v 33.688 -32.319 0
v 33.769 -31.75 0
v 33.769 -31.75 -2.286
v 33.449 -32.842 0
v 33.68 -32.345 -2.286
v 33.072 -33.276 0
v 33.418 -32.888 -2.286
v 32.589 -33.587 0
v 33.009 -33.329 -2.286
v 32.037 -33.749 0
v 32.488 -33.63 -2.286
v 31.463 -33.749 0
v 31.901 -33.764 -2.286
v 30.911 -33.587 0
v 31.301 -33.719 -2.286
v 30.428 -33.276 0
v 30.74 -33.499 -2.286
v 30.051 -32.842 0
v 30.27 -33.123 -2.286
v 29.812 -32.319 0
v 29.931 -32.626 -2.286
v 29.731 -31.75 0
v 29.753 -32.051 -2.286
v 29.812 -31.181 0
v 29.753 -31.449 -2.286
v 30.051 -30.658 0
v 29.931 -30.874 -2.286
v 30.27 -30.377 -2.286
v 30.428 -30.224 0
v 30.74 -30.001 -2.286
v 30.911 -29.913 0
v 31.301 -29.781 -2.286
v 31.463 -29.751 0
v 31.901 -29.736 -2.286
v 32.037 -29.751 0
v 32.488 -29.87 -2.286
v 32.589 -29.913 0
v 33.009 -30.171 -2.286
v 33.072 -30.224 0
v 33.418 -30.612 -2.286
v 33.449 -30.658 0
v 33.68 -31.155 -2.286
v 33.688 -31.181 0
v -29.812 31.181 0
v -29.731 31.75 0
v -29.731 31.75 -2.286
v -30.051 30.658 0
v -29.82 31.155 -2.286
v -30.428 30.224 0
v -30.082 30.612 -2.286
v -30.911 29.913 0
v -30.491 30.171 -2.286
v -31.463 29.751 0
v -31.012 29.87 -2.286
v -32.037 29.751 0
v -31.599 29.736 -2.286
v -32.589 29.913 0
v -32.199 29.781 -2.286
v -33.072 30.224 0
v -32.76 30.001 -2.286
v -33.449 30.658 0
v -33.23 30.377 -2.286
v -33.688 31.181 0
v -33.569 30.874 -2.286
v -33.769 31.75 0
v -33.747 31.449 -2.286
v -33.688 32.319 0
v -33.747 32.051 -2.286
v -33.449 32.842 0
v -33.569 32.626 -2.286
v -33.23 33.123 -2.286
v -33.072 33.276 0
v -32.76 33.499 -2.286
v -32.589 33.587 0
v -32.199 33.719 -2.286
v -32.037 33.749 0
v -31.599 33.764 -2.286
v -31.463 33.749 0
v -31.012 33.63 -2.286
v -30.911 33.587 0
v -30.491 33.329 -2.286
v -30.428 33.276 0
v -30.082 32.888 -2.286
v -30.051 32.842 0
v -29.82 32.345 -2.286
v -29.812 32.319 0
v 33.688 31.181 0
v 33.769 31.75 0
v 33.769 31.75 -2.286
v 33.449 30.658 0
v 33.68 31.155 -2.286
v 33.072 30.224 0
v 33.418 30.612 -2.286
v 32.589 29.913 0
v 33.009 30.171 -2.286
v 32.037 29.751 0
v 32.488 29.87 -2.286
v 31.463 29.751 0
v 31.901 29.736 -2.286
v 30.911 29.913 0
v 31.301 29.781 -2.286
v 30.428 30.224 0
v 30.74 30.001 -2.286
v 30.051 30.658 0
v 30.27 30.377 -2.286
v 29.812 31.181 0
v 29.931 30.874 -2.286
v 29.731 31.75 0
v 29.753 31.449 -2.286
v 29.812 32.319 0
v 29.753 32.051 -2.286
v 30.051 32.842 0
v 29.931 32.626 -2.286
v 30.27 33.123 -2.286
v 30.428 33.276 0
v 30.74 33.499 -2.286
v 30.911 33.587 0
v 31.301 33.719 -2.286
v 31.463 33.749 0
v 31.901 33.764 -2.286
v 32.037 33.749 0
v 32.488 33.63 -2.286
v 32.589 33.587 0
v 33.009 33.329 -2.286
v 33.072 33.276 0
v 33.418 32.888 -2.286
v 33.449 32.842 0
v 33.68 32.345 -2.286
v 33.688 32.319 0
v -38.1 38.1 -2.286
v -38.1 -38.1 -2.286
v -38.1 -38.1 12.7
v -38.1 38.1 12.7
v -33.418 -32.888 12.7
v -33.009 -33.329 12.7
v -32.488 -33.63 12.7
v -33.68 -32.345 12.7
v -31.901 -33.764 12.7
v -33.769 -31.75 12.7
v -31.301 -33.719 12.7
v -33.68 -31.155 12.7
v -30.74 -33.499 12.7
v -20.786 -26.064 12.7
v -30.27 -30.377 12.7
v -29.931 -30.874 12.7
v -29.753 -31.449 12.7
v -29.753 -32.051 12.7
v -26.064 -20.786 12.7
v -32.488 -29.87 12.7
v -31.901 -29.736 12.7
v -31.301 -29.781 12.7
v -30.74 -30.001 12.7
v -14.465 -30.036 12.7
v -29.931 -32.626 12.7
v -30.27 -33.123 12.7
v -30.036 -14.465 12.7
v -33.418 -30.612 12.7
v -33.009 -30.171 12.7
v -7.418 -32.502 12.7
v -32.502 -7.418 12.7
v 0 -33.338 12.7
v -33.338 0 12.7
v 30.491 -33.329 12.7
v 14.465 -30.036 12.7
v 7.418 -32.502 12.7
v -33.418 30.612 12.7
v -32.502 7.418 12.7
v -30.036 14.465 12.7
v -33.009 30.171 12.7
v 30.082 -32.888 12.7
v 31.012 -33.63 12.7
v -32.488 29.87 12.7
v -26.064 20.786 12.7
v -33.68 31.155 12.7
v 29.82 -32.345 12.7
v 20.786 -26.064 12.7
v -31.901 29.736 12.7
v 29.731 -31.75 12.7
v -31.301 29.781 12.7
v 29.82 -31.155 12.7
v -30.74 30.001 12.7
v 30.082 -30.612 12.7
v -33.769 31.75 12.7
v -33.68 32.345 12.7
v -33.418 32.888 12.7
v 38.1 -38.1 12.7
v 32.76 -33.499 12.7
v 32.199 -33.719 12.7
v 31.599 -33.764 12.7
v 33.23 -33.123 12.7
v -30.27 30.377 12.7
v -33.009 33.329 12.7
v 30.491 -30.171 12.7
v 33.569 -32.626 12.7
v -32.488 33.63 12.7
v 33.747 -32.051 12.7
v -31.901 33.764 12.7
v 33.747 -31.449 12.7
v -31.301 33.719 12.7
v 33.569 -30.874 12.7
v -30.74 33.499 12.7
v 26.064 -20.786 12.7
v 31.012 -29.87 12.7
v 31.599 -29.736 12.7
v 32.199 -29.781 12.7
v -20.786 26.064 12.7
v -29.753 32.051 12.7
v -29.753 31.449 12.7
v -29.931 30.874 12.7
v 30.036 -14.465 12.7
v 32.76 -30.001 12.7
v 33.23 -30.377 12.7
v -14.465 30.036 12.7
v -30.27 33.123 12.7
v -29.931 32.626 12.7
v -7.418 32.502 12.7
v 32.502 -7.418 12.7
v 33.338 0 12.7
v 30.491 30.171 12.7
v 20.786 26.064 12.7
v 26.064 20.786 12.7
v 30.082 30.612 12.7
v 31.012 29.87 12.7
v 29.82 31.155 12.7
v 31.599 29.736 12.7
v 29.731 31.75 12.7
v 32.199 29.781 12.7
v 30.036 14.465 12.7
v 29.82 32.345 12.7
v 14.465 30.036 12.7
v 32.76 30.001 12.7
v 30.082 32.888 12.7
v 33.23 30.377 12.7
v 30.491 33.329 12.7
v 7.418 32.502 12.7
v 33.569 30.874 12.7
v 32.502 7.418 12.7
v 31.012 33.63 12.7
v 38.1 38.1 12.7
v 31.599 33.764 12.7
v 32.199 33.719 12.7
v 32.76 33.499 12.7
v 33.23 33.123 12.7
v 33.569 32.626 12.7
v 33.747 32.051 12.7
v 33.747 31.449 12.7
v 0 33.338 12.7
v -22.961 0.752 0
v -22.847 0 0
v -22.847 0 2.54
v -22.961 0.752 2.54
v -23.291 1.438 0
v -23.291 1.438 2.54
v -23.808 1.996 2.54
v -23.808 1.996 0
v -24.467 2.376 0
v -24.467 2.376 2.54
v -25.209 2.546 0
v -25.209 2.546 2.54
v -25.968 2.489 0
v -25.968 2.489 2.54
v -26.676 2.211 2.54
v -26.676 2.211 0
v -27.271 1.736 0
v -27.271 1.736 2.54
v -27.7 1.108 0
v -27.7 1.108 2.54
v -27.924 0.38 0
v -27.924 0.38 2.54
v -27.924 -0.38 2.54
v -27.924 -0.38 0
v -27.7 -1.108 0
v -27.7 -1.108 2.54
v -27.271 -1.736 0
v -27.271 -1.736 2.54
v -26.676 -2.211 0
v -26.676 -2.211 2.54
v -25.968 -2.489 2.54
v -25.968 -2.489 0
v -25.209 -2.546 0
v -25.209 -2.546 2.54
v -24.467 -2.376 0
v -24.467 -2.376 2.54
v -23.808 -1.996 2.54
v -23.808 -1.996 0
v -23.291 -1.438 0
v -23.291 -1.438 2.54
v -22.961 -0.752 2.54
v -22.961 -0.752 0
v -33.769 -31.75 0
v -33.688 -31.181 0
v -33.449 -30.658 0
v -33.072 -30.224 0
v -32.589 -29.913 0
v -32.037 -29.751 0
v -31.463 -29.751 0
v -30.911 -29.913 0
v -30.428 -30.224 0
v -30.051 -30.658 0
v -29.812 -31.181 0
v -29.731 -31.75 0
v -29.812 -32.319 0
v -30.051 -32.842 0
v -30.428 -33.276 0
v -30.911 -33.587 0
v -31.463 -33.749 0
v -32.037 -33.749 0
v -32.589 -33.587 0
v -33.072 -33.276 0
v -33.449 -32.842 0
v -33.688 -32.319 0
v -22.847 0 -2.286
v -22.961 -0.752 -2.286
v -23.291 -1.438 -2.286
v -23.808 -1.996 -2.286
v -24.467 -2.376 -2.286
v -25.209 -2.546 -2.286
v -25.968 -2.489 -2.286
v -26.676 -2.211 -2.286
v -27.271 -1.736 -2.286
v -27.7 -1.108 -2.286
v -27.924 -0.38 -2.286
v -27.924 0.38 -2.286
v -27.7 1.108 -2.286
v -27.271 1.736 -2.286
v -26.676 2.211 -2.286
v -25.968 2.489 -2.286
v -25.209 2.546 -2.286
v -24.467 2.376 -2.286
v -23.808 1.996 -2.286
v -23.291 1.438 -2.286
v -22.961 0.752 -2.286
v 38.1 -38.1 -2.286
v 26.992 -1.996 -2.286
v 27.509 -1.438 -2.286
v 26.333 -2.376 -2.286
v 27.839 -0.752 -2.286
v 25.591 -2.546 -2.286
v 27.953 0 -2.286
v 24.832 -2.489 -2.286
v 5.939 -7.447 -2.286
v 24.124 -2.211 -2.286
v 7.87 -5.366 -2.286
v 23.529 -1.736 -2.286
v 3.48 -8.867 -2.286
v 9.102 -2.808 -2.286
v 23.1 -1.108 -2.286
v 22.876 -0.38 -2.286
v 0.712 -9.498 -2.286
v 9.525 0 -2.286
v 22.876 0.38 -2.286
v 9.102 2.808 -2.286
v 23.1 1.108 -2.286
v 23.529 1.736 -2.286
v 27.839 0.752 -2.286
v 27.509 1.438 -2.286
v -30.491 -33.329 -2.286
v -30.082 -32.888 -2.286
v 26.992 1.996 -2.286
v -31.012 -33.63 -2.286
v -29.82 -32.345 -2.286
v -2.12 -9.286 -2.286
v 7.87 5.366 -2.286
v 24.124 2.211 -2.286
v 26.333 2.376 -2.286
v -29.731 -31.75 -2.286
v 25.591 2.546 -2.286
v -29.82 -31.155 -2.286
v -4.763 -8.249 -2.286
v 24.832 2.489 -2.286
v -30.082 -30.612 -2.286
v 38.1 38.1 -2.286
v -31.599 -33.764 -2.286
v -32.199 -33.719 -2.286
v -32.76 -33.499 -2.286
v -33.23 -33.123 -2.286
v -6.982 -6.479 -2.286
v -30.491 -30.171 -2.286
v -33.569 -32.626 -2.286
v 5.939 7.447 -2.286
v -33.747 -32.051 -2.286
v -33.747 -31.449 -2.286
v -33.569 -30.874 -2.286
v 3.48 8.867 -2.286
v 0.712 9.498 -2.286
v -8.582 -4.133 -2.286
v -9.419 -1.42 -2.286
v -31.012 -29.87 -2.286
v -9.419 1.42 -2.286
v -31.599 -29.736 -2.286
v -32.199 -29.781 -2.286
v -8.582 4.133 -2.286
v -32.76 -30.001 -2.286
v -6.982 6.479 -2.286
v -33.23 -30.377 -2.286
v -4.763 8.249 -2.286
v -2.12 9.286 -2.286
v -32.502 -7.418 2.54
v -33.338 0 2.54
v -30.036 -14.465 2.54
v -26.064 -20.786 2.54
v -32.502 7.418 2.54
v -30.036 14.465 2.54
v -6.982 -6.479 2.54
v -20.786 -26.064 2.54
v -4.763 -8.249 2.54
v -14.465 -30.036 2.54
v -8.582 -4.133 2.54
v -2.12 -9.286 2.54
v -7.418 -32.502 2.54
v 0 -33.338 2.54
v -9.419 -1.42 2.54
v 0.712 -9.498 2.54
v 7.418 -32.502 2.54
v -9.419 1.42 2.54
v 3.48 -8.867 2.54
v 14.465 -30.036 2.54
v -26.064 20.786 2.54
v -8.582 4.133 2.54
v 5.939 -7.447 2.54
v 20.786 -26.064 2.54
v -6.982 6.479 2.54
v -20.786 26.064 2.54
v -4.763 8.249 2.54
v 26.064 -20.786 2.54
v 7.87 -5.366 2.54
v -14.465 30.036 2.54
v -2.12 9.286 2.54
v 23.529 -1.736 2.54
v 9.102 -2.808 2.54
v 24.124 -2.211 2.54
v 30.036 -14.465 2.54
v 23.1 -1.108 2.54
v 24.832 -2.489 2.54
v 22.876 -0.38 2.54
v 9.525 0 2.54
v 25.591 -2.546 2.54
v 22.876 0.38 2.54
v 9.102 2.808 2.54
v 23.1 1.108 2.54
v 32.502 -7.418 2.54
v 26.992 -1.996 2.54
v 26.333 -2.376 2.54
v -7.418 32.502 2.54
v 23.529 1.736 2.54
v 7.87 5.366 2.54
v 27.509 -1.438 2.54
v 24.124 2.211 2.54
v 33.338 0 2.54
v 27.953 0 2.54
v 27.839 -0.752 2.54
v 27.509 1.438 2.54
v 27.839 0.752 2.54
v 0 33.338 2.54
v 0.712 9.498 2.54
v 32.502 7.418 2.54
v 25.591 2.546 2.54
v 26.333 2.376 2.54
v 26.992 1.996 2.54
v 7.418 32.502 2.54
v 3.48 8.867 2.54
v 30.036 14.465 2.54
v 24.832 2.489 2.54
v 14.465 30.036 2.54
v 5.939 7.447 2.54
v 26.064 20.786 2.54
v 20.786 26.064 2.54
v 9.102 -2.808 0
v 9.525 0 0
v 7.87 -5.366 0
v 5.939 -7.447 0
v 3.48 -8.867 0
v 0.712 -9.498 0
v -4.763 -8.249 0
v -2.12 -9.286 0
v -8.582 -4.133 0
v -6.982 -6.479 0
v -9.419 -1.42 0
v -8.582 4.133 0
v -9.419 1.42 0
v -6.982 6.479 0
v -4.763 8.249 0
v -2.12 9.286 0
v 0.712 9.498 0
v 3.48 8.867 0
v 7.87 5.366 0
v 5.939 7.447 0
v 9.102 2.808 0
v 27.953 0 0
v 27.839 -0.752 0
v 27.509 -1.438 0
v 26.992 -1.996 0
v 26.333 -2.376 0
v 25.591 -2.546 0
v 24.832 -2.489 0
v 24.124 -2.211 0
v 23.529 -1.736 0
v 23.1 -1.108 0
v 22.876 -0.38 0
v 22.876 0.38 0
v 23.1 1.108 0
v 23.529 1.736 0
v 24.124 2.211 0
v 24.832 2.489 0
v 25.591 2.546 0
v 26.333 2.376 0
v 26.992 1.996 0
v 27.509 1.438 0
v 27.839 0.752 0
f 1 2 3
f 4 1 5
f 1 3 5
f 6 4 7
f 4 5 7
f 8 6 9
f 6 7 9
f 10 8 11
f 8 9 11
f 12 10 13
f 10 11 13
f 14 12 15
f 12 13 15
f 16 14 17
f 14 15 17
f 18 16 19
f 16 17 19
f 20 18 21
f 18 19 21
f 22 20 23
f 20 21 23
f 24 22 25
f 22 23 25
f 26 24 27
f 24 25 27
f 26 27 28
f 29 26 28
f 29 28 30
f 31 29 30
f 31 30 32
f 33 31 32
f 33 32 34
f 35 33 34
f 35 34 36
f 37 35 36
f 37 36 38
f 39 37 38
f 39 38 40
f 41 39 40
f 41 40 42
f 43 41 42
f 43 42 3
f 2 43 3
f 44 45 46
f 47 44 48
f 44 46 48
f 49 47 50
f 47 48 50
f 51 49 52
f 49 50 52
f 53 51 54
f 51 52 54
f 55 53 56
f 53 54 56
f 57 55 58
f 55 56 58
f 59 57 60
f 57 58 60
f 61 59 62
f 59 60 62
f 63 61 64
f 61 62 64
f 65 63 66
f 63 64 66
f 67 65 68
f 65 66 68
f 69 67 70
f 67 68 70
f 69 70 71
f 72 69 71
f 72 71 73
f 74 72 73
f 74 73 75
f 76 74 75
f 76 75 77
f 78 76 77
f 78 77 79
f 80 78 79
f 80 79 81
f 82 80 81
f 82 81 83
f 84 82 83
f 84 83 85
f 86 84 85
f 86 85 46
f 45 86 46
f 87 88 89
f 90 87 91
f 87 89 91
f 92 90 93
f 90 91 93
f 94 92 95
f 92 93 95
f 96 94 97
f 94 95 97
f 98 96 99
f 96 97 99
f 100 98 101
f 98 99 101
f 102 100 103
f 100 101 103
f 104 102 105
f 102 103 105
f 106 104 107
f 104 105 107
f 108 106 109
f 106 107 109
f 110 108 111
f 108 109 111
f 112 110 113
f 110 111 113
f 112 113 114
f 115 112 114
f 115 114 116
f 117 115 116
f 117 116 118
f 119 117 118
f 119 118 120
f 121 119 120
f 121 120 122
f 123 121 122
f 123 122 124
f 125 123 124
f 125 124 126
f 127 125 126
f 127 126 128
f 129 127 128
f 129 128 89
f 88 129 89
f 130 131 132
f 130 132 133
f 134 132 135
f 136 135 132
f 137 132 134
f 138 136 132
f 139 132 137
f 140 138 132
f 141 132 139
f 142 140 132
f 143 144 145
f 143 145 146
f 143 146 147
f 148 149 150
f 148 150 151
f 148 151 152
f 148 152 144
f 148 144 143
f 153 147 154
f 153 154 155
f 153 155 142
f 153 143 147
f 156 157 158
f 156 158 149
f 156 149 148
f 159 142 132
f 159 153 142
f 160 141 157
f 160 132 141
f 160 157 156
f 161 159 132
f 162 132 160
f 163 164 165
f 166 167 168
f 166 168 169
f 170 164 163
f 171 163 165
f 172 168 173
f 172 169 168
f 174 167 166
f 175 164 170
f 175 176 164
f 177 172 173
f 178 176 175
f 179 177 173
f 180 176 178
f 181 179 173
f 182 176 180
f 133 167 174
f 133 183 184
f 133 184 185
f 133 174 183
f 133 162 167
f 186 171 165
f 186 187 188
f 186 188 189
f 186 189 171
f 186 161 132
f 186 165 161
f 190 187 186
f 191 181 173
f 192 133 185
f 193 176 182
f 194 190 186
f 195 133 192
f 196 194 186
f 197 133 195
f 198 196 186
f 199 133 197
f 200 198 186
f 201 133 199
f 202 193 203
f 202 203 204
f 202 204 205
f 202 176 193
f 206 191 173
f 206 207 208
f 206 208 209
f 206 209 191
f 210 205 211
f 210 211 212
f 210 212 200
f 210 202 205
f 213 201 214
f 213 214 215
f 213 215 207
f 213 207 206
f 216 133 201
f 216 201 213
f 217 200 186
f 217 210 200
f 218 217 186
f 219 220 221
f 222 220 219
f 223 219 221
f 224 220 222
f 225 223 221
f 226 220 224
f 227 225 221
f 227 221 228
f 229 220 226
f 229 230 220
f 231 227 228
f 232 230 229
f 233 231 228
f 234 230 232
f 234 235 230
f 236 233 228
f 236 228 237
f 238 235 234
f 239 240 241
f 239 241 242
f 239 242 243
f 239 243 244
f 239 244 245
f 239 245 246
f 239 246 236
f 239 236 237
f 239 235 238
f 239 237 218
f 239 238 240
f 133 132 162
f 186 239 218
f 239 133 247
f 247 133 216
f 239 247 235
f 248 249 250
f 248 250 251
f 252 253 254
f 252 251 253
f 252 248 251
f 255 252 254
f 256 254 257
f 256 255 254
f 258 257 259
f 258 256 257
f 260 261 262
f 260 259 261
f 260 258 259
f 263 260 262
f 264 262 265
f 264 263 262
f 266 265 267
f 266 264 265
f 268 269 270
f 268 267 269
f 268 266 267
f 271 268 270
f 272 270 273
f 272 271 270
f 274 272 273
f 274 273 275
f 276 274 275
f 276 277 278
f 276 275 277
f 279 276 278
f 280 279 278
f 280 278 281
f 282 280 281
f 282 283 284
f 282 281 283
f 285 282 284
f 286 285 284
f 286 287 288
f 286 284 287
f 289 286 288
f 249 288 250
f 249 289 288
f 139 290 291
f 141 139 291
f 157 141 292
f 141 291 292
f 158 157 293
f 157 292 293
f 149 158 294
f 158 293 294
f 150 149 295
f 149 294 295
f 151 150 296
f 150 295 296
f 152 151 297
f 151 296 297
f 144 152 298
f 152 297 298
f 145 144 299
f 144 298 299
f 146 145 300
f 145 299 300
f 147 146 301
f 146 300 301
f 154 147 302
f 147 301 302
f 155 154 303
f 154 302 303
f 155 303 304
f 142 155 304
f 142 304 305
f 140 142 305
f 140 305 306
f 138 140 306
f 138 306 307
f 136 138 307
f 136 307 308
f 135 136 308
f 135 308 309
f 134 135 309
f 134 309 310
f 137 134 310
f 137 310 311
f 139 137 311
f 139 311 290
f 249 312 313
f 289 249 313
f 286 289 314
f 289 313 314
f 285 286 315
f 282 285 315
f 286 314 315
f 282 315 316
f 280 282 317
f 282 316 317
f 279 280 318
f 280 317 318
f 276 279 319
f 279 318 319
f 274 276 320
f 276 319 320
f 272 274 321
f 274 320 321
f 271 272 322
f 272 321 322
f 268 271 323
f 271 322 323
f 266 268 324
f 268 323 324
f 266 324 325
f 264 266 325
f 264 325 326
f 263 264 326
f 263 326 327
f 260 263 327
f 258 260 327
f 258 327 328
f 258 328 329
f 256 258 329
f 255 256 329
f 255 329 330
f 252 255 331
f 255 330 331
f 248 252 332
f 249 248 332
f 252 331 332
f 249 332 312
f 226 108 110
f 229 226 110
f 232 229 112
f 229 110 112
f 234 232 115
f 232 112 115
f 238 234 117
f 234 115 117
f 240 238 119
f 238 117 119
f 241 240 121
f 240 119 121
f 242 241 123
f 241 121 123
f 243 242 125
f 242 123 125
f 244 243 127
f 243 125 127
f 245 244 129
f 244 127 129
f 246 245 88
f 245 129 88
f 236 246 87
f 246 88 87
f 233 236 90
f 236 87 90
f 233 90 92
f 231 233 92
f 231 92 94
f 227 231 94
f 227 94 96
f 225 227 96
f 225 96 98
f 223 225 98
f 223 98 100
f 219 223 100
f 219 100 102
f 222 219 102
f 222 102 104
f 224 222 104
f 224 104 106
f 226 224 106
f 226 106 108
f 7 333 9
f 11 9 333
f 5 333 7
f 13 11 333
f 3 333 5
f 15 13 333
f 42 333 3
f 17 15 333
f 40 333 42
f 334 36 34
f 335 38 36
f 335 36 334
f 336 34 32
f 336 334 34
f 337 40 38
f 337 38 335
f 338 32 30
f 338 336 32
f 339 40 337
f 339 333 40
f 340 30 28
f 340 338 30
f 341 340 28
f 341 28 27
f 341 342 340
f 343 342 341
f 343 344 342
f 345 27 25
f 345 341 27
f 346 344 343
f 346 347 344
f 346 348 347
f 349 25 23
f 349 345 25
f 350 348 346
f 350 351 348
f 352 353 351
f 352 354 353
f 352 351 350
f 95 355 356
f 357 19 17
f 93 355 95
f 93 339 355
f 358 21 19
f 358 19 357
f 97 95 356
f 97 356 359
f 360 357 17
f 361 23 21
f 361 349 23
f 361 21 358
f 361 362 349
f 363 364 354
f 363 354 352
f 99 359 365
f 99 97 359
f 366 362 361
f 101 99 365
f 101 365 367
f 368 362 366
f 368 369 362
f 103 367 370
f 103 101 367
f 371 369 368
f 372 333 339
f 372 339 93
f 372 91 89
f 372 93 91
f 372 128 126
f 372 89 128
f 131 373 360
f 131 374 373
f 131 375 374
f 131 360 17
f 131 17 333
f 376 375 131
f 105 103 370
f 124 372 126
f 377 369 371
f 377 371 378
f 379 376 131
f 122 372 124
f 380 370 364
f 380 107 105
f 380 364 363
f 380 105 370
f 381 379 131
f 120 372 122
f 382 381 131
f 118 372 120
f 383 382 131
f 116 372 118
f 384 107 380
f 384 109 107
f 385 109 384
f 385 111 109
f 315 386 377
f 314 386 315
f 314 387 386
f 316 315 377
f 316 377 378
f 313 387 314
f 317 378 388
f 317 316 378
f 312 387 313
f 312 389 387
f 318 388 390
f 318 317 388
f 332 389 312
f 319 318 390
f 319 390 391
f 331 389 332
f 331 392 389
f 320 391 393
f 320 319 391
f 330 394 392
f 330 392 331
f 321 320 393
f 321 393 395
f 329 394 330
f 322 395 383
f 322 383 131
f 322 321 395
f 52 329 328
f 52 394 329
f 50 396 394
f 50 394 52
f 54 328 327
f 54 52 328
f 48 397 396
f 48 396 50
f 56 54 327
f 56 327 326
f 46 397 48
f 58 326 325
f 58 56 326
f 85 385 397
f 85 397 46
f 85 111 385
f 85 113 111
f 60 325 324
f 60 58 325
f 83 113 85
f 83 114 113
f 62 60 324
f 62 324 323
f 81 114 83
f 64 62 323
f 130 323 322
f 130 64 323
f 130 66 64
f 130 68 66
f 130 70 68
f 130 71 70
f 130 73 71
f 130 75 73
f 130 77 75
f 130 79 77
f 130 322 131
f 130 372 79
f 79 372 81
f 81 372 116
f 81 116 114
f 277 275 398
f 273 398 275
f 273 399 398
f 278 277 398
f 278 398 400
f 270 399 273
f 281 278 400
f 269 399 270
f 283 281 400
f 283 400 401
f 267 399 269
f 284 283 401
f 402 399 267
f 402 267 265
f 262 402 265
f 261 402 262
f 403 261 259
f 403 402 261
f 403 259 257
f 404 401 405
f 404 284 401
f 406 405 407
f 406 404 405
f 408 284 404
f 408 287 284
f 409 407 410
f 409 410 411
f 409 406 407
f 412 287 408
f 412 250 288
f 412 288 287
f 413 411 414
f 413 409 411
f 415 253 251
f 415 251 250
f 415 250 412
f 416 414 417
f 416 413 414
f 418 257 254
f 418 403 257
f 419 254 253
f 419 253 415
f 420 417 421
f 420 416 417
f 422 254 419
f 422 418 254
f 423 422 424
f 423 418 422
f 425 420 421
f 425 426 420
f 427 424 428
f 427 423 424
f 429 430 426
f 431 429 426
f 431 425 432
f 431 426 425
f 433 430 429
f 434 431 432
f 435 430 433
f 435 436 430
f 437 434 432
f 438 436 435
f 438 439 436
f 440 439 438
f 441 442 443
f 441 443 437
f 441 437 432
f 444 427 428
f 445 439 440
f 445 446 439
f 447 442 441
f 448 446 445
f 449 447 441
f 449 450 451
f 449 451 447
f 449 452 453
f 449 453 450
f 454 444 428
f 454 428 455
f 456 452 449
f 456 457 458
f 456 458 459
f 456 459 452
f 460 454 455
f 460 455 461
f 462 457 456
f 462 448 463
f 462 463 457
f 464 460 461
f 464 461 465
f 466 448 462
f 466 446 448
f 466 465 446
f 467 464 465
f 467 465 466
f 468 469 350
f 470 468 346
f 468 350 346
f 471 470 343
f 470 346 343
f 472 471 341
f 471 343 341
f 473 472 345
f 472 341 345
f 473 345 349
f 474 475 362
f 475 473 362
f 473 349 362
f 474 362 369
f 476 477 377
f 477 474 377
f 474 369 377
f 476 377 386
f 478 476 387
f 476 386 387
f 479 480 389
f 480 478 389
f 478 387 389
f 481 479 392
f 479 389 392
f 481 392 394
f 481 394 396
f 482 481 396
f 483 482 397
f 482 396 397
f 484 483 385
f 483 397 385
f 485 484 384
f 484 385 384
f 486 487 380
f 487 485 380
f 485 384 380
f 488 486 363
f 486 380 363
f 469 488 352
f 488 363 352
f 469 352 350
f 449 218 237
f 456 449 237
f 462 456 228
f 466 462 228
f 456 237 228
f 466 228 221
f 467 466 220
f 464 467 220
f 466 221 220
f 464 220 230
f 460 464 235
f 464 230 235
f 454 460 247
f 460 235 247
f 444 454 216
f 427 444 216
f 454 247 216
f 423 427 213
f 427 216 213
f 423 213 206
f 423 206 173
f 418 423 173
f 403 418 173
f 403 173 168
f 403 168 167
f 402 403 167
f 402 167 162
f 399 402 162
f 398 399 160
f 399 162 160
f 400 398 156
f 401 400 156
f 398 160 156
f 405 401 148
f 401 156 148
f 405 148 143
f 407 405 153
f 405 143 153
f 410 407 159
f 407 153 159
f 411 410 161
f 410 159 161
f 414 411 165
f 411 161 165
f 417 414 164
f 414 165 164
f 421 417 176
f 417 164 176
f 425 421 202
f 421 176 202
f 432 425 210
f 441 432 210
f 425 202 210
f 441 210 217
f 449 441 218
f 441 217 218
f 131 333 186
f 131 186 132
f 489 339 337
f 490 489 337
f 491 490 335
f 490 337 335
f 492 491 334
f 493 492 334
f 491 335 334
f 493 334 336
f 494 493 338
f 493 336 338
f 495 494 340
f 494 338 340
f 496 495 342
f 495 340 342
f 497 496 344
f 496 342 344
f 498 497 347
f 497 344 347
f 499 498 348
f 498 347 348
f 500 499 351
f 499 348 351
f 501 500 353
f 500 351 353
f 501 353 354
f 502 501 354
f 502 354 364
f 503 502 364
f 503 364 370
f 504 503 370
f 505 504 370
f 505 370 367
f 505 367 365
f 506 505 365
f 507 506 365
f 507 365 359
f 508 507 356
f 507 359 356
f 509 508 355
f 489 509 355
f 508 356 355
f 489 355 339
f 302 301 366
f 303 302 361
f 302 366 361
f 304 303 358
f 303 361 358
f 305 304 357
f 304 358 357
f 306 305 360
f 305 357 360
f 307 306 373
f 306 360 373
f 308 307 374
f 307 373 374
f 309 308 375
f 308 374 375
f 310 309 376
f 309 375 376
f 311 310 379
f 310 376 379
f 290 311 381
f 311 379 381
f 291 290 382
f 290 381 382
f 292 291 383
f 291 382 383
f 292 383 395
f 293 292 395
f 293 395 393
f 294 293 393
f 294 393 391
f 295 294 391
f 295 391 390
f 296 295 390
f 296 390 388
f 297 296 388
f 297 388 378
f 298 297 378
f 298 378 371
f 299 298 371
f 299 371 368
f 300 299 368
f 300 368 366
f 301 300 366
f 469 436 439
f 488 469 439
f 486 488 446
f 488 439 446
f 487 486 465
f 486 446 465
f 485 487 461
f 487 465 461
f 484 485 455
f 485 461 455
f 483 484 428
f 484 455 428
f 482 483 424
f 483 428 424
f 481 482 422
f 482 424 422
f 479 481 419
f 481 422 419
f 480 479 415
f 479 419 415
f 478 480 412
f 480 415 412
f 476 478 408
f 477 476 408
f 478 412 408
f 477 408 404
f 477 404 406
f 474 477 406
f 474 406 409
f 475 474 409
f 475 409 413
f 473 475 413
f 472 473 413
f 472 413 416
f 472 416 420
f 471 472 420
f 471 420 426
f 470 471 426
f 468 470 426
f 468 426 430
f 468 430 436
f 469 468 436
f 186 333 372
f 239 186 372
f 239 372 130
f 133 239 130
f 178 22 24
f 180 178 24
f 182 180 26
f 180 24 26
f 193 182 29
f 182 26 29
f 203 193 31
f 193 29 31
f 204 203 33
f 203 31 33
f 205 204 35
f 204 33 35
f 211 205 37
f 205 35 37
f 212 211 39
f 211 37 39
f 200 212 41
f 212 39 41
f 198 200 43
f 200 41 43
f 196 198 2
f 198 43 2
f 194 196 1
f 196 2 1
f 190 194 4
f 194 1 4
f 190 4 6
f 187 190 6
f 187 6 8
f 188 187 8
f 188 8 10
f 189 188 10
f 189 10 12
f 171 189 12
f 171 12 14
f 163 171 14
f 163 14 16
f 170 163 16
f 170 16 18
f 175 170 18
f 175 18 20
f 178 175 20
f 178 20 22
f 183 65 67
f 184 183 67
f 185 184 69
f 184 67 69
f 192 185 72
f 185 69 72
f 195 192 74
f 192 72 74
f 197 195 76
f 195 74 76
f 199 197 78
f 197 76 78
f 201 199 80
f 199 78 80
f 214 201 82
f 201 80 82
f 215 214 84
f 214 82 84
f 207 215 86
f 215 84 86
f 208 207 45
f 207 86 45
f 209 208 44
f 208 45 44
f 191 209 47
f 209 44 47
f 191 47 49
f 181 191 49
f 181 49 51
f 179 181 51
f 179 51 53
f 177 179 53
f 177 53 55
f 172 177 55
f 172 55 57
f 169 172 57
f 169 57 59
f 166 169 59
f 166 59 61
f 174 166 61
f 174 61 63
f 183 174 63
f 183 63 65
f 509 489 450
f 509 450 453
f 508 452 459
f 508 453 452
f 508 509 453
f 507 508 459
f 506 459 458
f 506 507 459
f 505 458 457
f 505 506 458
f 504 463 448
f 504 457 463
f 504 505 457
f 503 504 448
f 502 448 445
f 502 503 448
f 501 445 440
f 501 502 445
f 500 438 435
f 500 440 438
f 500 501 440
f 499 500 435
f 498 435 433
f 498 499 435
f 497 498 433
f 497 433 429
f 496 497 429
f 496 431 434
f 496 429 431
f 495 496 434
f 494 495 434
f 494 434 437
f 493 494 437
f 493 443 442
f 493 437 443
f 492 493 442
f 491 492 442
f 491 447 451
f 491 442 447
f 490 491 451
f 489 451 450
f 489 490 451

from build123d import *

# Parameters (mm, degrees)
SKETCH1_W               = 76.2
SKETCH1_H               = 76.2
BOSS_EXTRUDE1_DEPTH     = 12.7
SKETCH2_R               = 33.3375
CUT_EXTRUDE1_DEPTH      = 10.16
SKETCH3_R               = 9.525
CUT_EXTRUDE2_DEPTH      = 19.05
CUT_EXTRUDE3_DEPTH      = 55.831064188
CUT_EXTRUDE3_DEPTH_BACK = 55.831064188
SKETCH4_R               = 1.27
SKETCH4_R_2             = 2.5527
F_10_32_TAPPED_HOLE1_D  = 4.0386
BOSS_EXTRUDE2_START     = 2.286
SKETCH7_W               = 76.2
SKETCH7_H               = 76.2
SKETCH7_R               = 2.5527
SKETCH7_R_2             = 2.0193
SKETCH7_R_3             = 9.525
BOSS_EXTRUDE2_DEPTH     = 2.286


with BuildPart() as part:
    # Sketch1 → Boss-Extrude1 (new body)
    with BuildSketch(Plane.XY):
        Rectangle(SKETCH1_W, SKETCH1_H)
    extrude(amount=BOSS_EXTRUDE1_DEPTH)

    # Sketch2 → Cut-Extrude1 (cut)
    with BuildSketch(Plane.XY.offset(12.7)):
        Circle(SKETCH2_R)
    extrude(amount=-CUT_EXTRUDE1_DEPTH, mode=Mode.SUBTRACT)

    # Sketch3 → Cut-Extrude2 (cut)
    with BuildSketch(Plane.XY.offset(2.54)):
        Circle(SKETCH3_R)
    extrude(amount=-CUT_EXTRUDE2_DEPTH, mode=Mode.SUBTRACT)

    # Sketch4 → Cut-Extrude3 (cut, two sides: drawn at the far end of the back side and taken through both)
    with BuildSketch(Plane.XY.offset(2.54).offset(-CUT_EXTRUDE3_DEPTH_BACK)):
        with Locations((-31.75, 31.75)):
            Circle(SKETCH4_R)
        with Locations((31.75, 31.75)):
            Circle(SKETCH4_R)
        with Locations((31.75, -31.75)):
            Circle(SKETCH4_R)
        with Locations((-31.75, -31.75)):
            Circle(SKETCH4_R)
        with Locations((-25.4, 0)):
            Circle(SKETCH4_R_2)
        with Locations((25.4, 0)):
            Circle(SKETCH4_R_2)
    extrude(amount=CUT_EXTRUDE3_DEPTH + CUT_EXTRUDE3_DEPTH_BACK, mode=Mode.SUBTRACT)

    # #10-32 Tapped Hole1 (through all)
    with Locations(Plane.XY.offset(12.7)):
        with Locations((-31.75, 31.75), (-31.75, -31.75), (31.75, -31.75), (31.75, 31.75)):
            Hole(F_10_32_TAPPED_HOLE1_D / 2)

    # Sketch7 → Boss-Extrude2 (add)
    with BuildSketch(Plane(origin=(0, 0, 0), x_dir=(-1, 0, 0), z_dir=(0, 0, -1)).offset(BOSS_EXTRUDE2_START)):
        Rectangle(SKETCH7_W, SKETCH7_H)
        with Locations(Location((-25.4, 0, 0), (0, 0, 180))):
            Circle(SKETCH7_R, mode=Mode.SUBTRACT)
        with Locations(Location((-31.75, 31.75, 0), (0, 0, 180))):
            Circle(SKETCH7_R_2, mode=Mode.SUBTRACT)
        with Locations(Location((0, 0, 0), (0, 0, 180))):
            Circle(SKETCH7_R_3, mode=Mode.SUBTRACT)
        with Locations(Location((25.4, 0, 0), (0, 0, 180))):
            Circle(SKETCH7_R, mode=Mode.SUBTRACT)
        with Locations(Location((31.75, 31.75, 0), (0, 0, 180))):
            Circle(SKETCH7_R_2, mode=Mode.SUBTRACT)
        with Locations(Location((31.75, -31.75, 0), (0, 0, 180))):
            Circle(SKETCH7_R_2, mode=Mode.SUBTRACT)
        with Locations(Location((-31.75, -31.75, 0), (0, 0, 180))):
            Circle(SKETCH7_R_2, mode=Mode.SUBTRACT)
    extrude(amount=-BOSS_EXTRUDE2_DEPTH)


solid = part.part
